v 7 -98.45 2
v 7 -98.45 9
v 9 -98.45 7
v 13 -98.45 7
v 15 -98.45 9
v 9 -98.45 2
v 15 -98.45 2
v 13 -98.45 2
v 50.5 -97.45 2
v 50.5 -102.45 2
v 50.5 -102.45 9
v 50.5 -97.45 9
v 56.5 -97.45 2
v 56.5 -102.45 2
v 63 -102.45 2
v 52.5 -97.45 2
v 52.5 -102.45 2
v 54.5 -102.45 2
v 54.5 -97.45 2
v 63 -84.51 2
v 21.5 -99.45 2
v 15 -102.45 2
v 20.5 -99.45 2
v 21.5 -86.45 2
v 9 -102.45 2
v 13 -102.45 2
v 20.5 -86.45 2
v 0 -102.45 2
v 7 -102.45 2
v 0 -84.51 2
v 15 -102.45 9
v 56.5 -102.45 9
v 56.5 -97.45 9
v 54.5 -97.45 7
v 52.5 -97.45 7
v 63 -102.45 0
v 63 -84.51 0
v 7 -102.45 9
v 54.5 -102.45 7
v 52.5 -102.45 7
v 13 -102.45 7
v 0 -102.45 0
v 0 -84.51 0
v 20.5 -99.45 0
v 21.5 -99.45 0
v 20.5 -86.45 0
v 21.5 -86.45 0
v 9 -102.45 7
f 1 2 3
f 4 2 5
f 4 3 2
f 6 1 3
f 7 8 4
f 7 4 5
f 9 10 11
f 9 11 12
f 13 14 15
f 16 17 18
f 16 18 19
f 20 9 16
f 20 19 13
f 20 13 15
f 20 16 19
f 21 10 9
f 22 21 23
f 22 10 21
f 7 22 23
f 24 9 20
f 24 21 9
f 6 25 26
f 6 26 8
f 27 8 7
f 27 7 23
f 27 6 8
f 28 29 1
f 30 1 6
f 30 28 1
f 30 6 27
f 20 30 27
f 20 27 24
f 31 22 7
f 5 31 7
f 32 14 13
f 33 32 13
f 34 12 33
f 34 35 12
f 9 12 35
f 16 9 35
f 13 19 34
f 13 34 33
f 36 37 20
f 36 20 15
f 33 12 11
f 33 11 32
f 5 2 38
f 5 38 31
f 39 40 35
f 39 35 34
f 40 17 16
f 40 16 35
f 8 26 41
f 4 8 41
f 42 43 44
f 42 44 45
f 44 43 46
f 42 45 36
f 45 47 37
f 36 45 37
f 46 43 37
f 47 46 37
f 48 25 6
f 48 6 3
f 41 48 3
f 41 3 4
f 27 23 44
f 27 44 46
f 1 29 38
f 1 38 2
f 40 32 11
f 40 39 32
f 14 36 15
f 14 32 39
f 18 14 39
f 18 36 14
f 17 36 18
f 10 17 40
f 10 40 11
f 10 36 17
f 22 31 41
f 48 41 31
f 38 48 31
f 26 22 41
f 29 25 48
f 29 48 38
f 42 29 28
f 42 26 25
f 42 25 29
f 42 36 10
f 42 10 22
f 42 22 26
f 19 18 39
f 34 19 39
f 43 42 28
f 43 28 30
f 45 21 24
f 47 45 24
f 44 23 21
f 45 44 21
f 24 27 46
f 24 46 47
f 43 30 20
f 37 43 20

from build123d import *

# Parameters (mm, degrees)
P_IDAT_VYSUNUT_M1_DEPTH        = 2
SKICA3_R                       = 2.45
P_IDAT_VYSUNUT_M3_DEPTH        = 5
P_IDAT_VYSUNUT_M4_DEPTH        = 37.5
SKICA8_W                       = 10
SKICA8_H                       = 10
ODEBRAT_VYSUNUT_M2_DEPTH       = 4
SKICA10_W                      = 27.5
SKICA10_H                      = 79
ODEBRAT_VYSUNUT_M3_DEPTH       = 3
P_IDAT_VYSUNUT_M5_DEPTH        = 1
SKICA13_W                      = 3
SKICA13_H                      = 36.5
ODEBRAT_VYSUNUT_M6_DEPTH       = 103.45
SKICA14_W                      = 3
SKICA14_H                      = 36.5
ODEBRAT_VYSUNUT_M7_DEPTH       = 103.45
SKICA15_W                      = 36.5
SKICA15_H                      = 3
ODEBRAT_VYSUNUT_M8_DEPTH       = 61
SKICA19_W                      = 37
SKICA19_H                      = 13
ODEBRAT_VYSUNUT_M9_DEPTH       = 4
SKICA20_W                      = 63
SKICA20_H                      = 102.45
SKICA20_W_2                    = 57
SKICA20_H_2                    = 79
ODEBRAT_VYSUNUT_M10_DEPTH      = 1
SKICA22_W                      = 8
SKICA22_H                      = 4
SKICA22_W_2                    = 6
SKICA22_H_2                    = 5
P_IDAT_VYSUNUT_M6_DEPTH        = 7
SKICA23_W                      = 4
SKICA23_H                      = 5
SKICA23_W_2                    = 2
ODEBRAT_VYSUNUT_M12_DEPTH      = 5
SKICA25_W                      = 1
SKICA25_H                      = 13
ODEBRAT_VYSUNUT_M13_DEPTH      = 10
SKICA28_W                      = 63
SKICA28_H                      = 84.509642994
ODEBRAT_VYSUNUT_M14_DEPTH      = 8
ODEBRAT_VYSUNUT_M14_DEPTH_BACK = 3


with BuildPart() as part:
    # Skica1 → Přidat vysunutím1 (new body)
    with BuildSketch(Plane.XY):
        Polygon((13, -102.45), (13, -115.45), (50, -115.45), (50, -102.45), (63, -102.45), (63, 0), (0, 0), (0, -102.45), align=None)
    extrude(amount=P_IDAT_VYSUNUT_M1_DEPTH)

    # Skica3 → Přidat vysunutím3 (add)
    with BuildSketch(Plane.XY.offset(2)):
        with Locations((7.55, -6.45)):
            Circle(SKICA3_R)
        with Locations((7.55, -78.45)):
            Circle(SKICA3_R)
        with Locations((55.55, -78.45)):
            Circle(SKICA3_R)
        with Locations((55.55, -6.45)):
            Circle(SKICA3_R)
    extrude(amount=P_IDAT_VYSUNUT_M3_DEPTH)

    # Skica4 → Přidat vysunutím4 (add)
    with BuildSketch(Plane.XY.offset(2)):
        Polygon((63, 0), (63, -102.45), (60, -102.45), (60, -3), (3, -3), (3, -102.45), (0, -102.45), (0, 0), align=None)
    extrude(amount=P_IDAT_VYSUNUT_M4_DEPTH)

    # Skica8 → Odebrat vysunutím2 (cut, through all)
    with BuildSketch(Plane.ZY.offset(-60)):
        with Locations((7, -49)):
            Rectangle(SKICA8_W, SKICA8_H)
    extrude(amount=-ODEBRAT_VYSUNUT_M2_DEPTH, mode=Mode.SUBTRACT)

    # Skica10 → Odebrat vysunutím3 (cut)
    with BuildSketch(Plane.ZY):
        with Locations((25.75, -42.5)):
            Rectangle(SKICA10_W, SKICA10_H)
    extrude(amount=-ODEBRAT_VYSUNUT_M3_DEPTH, mode=Mode.SUBTRACT)

    # Skica11 → Přidat vysunutím5 (add)
    with BuildSketch(Plane.XY.offset(2)):
        Polygon((3, -82), (60, -82), (60, -102.45), (50, -102.45), (50, -115.45), (13, -115.45), (13, -102.45), (3, -102.45), align=None)
    extrude(amount=P_IDAT_VYSUNUT_M5_DEPTH)

    # Skica13 → Odebrat vysunutím6 (cut, through all)
    with BuildSketch(Plane.XZ.offset(102.45)):
        with Locations((1.5, 21.25)):
            Rectangle(SKICA13_W, SKICA13_H)
    extrude(amount=-ODEBRAT_VYSUNUT_M6_DEPTH, mode=Mode.SUBTRACT)

    # Skica14 → Odebrat vysunutím7 (cut, through all)
    with BuildSketch(Plane.XZ.offset(102.45)):
        with Locations((61.5, 21.25)):
            Rectangle(SKICA14_W, SKICA14_H)
    extrude(amount=-ODEBRAT_VYSUNUT_M7_DEPTH, mode=Mode.SUBTRACT)

    # Skica15 → Odebrat vysunutím8 (cut, through all)
    with BuildSketch(Plane.ZY.offset(-3)):
        with Locations((21.25, -1.5)):
            Rectangle(SKICA15_W, SKICA15_H)
    extrude(amount=-ODEBRAT_VYSUNUT_M8_DEPTH, mode=Mode.SUBTRACT)

    # Skica19 → Odebrat vysunutím9 (cut, through all)
    with BuildSketch(Plane.XY.offset(3)):
        with Locations((31.5, -108.95)):
            Rectangle(SKICA19_W, SKICA19_H)
    extrude(amount=-ODEBRAT_VYSUNUT_M9_DEPTH, mode=Mode.SUBTRACT)

    # Skica20 → Odebrat vysunutím10 (cut)
    with BuildSketch(Plane.XY.offset(3)):
        with Locations((31.5, -51.225)):
            Rectangle(SKICA20_W, SKICA20_H)
        with Locations((31.5, -42.5)):
            Rectangle(SKICA20_W_2, SKICA20_H_2, mode=Mode.SUBTRACT)
    extrude(amount=-ODEBRAT_VYSUNUT_M10_DEPTH, mode=Mode.SUBTRACT)

    # Skica22 → Přidat vysunutím6 (add)
    with BuildSketch(Plane.XY.offset(2)):
        with Locations((11, -100.45)):
            Rectangle(SKICA22_W, SKICA22_H)
        with Locations((53.5, -99.95)):
            Rectangle(SKICA22_W_2, SKICA22_H_2)
    extrude(amount=P_IDAT_VYSUNUT_M6_DEPTH)

    # Skica23 → Odebrat vysunutím12 (cut)
    with BuildSketch(Plane.XZ.offset(102.45)):
        with Locations((11, 4.5)):
            Rectangle(SKICA23_W, SKICA23_H)
        with Locations((53.5, 4.5)):
            Rectangle(SKICA23_W_2, SKICA23_H)
    extrude(amount=-ODEBRAT_VYSUNUT_M12_DEPTH, mode=Mode.SUBTRACT)

    # Skica25 → Odebrat vysunutím13 (cut)
    with BuildSketch(Plane.XY.offset(2)):
        with Locations((21, -92.95)):
            Rectangle(SKICA25_W, SKICA25_H)
    extrude(amount=-ODEBRAT_VYSUNUT_M13_DEPTH, mode=Mode.SUBTRACT)

    # Skica28 → Odebrat vysunutím14 (cut, two sides)
    with BuildSketch(Plane.XY.offset(2)) as odebrat_vysunut_m14_sk:
        with Locations((31.5, -42.254821497)):
            Rectangle(SKICA28_W, SKICA28_H)
    extrude(amount=ODEBRAT_VYSUNUT_M14_DEPTH, mode=Mode.SUBTRACT)
    extrude(odebrat_vysunut_m14_sk.sketch, amount=-ODEBRAT_VYSUNUT_M14_DEPTH_BACK, mode=Mode.SUBTRACT)


solid = part.part
